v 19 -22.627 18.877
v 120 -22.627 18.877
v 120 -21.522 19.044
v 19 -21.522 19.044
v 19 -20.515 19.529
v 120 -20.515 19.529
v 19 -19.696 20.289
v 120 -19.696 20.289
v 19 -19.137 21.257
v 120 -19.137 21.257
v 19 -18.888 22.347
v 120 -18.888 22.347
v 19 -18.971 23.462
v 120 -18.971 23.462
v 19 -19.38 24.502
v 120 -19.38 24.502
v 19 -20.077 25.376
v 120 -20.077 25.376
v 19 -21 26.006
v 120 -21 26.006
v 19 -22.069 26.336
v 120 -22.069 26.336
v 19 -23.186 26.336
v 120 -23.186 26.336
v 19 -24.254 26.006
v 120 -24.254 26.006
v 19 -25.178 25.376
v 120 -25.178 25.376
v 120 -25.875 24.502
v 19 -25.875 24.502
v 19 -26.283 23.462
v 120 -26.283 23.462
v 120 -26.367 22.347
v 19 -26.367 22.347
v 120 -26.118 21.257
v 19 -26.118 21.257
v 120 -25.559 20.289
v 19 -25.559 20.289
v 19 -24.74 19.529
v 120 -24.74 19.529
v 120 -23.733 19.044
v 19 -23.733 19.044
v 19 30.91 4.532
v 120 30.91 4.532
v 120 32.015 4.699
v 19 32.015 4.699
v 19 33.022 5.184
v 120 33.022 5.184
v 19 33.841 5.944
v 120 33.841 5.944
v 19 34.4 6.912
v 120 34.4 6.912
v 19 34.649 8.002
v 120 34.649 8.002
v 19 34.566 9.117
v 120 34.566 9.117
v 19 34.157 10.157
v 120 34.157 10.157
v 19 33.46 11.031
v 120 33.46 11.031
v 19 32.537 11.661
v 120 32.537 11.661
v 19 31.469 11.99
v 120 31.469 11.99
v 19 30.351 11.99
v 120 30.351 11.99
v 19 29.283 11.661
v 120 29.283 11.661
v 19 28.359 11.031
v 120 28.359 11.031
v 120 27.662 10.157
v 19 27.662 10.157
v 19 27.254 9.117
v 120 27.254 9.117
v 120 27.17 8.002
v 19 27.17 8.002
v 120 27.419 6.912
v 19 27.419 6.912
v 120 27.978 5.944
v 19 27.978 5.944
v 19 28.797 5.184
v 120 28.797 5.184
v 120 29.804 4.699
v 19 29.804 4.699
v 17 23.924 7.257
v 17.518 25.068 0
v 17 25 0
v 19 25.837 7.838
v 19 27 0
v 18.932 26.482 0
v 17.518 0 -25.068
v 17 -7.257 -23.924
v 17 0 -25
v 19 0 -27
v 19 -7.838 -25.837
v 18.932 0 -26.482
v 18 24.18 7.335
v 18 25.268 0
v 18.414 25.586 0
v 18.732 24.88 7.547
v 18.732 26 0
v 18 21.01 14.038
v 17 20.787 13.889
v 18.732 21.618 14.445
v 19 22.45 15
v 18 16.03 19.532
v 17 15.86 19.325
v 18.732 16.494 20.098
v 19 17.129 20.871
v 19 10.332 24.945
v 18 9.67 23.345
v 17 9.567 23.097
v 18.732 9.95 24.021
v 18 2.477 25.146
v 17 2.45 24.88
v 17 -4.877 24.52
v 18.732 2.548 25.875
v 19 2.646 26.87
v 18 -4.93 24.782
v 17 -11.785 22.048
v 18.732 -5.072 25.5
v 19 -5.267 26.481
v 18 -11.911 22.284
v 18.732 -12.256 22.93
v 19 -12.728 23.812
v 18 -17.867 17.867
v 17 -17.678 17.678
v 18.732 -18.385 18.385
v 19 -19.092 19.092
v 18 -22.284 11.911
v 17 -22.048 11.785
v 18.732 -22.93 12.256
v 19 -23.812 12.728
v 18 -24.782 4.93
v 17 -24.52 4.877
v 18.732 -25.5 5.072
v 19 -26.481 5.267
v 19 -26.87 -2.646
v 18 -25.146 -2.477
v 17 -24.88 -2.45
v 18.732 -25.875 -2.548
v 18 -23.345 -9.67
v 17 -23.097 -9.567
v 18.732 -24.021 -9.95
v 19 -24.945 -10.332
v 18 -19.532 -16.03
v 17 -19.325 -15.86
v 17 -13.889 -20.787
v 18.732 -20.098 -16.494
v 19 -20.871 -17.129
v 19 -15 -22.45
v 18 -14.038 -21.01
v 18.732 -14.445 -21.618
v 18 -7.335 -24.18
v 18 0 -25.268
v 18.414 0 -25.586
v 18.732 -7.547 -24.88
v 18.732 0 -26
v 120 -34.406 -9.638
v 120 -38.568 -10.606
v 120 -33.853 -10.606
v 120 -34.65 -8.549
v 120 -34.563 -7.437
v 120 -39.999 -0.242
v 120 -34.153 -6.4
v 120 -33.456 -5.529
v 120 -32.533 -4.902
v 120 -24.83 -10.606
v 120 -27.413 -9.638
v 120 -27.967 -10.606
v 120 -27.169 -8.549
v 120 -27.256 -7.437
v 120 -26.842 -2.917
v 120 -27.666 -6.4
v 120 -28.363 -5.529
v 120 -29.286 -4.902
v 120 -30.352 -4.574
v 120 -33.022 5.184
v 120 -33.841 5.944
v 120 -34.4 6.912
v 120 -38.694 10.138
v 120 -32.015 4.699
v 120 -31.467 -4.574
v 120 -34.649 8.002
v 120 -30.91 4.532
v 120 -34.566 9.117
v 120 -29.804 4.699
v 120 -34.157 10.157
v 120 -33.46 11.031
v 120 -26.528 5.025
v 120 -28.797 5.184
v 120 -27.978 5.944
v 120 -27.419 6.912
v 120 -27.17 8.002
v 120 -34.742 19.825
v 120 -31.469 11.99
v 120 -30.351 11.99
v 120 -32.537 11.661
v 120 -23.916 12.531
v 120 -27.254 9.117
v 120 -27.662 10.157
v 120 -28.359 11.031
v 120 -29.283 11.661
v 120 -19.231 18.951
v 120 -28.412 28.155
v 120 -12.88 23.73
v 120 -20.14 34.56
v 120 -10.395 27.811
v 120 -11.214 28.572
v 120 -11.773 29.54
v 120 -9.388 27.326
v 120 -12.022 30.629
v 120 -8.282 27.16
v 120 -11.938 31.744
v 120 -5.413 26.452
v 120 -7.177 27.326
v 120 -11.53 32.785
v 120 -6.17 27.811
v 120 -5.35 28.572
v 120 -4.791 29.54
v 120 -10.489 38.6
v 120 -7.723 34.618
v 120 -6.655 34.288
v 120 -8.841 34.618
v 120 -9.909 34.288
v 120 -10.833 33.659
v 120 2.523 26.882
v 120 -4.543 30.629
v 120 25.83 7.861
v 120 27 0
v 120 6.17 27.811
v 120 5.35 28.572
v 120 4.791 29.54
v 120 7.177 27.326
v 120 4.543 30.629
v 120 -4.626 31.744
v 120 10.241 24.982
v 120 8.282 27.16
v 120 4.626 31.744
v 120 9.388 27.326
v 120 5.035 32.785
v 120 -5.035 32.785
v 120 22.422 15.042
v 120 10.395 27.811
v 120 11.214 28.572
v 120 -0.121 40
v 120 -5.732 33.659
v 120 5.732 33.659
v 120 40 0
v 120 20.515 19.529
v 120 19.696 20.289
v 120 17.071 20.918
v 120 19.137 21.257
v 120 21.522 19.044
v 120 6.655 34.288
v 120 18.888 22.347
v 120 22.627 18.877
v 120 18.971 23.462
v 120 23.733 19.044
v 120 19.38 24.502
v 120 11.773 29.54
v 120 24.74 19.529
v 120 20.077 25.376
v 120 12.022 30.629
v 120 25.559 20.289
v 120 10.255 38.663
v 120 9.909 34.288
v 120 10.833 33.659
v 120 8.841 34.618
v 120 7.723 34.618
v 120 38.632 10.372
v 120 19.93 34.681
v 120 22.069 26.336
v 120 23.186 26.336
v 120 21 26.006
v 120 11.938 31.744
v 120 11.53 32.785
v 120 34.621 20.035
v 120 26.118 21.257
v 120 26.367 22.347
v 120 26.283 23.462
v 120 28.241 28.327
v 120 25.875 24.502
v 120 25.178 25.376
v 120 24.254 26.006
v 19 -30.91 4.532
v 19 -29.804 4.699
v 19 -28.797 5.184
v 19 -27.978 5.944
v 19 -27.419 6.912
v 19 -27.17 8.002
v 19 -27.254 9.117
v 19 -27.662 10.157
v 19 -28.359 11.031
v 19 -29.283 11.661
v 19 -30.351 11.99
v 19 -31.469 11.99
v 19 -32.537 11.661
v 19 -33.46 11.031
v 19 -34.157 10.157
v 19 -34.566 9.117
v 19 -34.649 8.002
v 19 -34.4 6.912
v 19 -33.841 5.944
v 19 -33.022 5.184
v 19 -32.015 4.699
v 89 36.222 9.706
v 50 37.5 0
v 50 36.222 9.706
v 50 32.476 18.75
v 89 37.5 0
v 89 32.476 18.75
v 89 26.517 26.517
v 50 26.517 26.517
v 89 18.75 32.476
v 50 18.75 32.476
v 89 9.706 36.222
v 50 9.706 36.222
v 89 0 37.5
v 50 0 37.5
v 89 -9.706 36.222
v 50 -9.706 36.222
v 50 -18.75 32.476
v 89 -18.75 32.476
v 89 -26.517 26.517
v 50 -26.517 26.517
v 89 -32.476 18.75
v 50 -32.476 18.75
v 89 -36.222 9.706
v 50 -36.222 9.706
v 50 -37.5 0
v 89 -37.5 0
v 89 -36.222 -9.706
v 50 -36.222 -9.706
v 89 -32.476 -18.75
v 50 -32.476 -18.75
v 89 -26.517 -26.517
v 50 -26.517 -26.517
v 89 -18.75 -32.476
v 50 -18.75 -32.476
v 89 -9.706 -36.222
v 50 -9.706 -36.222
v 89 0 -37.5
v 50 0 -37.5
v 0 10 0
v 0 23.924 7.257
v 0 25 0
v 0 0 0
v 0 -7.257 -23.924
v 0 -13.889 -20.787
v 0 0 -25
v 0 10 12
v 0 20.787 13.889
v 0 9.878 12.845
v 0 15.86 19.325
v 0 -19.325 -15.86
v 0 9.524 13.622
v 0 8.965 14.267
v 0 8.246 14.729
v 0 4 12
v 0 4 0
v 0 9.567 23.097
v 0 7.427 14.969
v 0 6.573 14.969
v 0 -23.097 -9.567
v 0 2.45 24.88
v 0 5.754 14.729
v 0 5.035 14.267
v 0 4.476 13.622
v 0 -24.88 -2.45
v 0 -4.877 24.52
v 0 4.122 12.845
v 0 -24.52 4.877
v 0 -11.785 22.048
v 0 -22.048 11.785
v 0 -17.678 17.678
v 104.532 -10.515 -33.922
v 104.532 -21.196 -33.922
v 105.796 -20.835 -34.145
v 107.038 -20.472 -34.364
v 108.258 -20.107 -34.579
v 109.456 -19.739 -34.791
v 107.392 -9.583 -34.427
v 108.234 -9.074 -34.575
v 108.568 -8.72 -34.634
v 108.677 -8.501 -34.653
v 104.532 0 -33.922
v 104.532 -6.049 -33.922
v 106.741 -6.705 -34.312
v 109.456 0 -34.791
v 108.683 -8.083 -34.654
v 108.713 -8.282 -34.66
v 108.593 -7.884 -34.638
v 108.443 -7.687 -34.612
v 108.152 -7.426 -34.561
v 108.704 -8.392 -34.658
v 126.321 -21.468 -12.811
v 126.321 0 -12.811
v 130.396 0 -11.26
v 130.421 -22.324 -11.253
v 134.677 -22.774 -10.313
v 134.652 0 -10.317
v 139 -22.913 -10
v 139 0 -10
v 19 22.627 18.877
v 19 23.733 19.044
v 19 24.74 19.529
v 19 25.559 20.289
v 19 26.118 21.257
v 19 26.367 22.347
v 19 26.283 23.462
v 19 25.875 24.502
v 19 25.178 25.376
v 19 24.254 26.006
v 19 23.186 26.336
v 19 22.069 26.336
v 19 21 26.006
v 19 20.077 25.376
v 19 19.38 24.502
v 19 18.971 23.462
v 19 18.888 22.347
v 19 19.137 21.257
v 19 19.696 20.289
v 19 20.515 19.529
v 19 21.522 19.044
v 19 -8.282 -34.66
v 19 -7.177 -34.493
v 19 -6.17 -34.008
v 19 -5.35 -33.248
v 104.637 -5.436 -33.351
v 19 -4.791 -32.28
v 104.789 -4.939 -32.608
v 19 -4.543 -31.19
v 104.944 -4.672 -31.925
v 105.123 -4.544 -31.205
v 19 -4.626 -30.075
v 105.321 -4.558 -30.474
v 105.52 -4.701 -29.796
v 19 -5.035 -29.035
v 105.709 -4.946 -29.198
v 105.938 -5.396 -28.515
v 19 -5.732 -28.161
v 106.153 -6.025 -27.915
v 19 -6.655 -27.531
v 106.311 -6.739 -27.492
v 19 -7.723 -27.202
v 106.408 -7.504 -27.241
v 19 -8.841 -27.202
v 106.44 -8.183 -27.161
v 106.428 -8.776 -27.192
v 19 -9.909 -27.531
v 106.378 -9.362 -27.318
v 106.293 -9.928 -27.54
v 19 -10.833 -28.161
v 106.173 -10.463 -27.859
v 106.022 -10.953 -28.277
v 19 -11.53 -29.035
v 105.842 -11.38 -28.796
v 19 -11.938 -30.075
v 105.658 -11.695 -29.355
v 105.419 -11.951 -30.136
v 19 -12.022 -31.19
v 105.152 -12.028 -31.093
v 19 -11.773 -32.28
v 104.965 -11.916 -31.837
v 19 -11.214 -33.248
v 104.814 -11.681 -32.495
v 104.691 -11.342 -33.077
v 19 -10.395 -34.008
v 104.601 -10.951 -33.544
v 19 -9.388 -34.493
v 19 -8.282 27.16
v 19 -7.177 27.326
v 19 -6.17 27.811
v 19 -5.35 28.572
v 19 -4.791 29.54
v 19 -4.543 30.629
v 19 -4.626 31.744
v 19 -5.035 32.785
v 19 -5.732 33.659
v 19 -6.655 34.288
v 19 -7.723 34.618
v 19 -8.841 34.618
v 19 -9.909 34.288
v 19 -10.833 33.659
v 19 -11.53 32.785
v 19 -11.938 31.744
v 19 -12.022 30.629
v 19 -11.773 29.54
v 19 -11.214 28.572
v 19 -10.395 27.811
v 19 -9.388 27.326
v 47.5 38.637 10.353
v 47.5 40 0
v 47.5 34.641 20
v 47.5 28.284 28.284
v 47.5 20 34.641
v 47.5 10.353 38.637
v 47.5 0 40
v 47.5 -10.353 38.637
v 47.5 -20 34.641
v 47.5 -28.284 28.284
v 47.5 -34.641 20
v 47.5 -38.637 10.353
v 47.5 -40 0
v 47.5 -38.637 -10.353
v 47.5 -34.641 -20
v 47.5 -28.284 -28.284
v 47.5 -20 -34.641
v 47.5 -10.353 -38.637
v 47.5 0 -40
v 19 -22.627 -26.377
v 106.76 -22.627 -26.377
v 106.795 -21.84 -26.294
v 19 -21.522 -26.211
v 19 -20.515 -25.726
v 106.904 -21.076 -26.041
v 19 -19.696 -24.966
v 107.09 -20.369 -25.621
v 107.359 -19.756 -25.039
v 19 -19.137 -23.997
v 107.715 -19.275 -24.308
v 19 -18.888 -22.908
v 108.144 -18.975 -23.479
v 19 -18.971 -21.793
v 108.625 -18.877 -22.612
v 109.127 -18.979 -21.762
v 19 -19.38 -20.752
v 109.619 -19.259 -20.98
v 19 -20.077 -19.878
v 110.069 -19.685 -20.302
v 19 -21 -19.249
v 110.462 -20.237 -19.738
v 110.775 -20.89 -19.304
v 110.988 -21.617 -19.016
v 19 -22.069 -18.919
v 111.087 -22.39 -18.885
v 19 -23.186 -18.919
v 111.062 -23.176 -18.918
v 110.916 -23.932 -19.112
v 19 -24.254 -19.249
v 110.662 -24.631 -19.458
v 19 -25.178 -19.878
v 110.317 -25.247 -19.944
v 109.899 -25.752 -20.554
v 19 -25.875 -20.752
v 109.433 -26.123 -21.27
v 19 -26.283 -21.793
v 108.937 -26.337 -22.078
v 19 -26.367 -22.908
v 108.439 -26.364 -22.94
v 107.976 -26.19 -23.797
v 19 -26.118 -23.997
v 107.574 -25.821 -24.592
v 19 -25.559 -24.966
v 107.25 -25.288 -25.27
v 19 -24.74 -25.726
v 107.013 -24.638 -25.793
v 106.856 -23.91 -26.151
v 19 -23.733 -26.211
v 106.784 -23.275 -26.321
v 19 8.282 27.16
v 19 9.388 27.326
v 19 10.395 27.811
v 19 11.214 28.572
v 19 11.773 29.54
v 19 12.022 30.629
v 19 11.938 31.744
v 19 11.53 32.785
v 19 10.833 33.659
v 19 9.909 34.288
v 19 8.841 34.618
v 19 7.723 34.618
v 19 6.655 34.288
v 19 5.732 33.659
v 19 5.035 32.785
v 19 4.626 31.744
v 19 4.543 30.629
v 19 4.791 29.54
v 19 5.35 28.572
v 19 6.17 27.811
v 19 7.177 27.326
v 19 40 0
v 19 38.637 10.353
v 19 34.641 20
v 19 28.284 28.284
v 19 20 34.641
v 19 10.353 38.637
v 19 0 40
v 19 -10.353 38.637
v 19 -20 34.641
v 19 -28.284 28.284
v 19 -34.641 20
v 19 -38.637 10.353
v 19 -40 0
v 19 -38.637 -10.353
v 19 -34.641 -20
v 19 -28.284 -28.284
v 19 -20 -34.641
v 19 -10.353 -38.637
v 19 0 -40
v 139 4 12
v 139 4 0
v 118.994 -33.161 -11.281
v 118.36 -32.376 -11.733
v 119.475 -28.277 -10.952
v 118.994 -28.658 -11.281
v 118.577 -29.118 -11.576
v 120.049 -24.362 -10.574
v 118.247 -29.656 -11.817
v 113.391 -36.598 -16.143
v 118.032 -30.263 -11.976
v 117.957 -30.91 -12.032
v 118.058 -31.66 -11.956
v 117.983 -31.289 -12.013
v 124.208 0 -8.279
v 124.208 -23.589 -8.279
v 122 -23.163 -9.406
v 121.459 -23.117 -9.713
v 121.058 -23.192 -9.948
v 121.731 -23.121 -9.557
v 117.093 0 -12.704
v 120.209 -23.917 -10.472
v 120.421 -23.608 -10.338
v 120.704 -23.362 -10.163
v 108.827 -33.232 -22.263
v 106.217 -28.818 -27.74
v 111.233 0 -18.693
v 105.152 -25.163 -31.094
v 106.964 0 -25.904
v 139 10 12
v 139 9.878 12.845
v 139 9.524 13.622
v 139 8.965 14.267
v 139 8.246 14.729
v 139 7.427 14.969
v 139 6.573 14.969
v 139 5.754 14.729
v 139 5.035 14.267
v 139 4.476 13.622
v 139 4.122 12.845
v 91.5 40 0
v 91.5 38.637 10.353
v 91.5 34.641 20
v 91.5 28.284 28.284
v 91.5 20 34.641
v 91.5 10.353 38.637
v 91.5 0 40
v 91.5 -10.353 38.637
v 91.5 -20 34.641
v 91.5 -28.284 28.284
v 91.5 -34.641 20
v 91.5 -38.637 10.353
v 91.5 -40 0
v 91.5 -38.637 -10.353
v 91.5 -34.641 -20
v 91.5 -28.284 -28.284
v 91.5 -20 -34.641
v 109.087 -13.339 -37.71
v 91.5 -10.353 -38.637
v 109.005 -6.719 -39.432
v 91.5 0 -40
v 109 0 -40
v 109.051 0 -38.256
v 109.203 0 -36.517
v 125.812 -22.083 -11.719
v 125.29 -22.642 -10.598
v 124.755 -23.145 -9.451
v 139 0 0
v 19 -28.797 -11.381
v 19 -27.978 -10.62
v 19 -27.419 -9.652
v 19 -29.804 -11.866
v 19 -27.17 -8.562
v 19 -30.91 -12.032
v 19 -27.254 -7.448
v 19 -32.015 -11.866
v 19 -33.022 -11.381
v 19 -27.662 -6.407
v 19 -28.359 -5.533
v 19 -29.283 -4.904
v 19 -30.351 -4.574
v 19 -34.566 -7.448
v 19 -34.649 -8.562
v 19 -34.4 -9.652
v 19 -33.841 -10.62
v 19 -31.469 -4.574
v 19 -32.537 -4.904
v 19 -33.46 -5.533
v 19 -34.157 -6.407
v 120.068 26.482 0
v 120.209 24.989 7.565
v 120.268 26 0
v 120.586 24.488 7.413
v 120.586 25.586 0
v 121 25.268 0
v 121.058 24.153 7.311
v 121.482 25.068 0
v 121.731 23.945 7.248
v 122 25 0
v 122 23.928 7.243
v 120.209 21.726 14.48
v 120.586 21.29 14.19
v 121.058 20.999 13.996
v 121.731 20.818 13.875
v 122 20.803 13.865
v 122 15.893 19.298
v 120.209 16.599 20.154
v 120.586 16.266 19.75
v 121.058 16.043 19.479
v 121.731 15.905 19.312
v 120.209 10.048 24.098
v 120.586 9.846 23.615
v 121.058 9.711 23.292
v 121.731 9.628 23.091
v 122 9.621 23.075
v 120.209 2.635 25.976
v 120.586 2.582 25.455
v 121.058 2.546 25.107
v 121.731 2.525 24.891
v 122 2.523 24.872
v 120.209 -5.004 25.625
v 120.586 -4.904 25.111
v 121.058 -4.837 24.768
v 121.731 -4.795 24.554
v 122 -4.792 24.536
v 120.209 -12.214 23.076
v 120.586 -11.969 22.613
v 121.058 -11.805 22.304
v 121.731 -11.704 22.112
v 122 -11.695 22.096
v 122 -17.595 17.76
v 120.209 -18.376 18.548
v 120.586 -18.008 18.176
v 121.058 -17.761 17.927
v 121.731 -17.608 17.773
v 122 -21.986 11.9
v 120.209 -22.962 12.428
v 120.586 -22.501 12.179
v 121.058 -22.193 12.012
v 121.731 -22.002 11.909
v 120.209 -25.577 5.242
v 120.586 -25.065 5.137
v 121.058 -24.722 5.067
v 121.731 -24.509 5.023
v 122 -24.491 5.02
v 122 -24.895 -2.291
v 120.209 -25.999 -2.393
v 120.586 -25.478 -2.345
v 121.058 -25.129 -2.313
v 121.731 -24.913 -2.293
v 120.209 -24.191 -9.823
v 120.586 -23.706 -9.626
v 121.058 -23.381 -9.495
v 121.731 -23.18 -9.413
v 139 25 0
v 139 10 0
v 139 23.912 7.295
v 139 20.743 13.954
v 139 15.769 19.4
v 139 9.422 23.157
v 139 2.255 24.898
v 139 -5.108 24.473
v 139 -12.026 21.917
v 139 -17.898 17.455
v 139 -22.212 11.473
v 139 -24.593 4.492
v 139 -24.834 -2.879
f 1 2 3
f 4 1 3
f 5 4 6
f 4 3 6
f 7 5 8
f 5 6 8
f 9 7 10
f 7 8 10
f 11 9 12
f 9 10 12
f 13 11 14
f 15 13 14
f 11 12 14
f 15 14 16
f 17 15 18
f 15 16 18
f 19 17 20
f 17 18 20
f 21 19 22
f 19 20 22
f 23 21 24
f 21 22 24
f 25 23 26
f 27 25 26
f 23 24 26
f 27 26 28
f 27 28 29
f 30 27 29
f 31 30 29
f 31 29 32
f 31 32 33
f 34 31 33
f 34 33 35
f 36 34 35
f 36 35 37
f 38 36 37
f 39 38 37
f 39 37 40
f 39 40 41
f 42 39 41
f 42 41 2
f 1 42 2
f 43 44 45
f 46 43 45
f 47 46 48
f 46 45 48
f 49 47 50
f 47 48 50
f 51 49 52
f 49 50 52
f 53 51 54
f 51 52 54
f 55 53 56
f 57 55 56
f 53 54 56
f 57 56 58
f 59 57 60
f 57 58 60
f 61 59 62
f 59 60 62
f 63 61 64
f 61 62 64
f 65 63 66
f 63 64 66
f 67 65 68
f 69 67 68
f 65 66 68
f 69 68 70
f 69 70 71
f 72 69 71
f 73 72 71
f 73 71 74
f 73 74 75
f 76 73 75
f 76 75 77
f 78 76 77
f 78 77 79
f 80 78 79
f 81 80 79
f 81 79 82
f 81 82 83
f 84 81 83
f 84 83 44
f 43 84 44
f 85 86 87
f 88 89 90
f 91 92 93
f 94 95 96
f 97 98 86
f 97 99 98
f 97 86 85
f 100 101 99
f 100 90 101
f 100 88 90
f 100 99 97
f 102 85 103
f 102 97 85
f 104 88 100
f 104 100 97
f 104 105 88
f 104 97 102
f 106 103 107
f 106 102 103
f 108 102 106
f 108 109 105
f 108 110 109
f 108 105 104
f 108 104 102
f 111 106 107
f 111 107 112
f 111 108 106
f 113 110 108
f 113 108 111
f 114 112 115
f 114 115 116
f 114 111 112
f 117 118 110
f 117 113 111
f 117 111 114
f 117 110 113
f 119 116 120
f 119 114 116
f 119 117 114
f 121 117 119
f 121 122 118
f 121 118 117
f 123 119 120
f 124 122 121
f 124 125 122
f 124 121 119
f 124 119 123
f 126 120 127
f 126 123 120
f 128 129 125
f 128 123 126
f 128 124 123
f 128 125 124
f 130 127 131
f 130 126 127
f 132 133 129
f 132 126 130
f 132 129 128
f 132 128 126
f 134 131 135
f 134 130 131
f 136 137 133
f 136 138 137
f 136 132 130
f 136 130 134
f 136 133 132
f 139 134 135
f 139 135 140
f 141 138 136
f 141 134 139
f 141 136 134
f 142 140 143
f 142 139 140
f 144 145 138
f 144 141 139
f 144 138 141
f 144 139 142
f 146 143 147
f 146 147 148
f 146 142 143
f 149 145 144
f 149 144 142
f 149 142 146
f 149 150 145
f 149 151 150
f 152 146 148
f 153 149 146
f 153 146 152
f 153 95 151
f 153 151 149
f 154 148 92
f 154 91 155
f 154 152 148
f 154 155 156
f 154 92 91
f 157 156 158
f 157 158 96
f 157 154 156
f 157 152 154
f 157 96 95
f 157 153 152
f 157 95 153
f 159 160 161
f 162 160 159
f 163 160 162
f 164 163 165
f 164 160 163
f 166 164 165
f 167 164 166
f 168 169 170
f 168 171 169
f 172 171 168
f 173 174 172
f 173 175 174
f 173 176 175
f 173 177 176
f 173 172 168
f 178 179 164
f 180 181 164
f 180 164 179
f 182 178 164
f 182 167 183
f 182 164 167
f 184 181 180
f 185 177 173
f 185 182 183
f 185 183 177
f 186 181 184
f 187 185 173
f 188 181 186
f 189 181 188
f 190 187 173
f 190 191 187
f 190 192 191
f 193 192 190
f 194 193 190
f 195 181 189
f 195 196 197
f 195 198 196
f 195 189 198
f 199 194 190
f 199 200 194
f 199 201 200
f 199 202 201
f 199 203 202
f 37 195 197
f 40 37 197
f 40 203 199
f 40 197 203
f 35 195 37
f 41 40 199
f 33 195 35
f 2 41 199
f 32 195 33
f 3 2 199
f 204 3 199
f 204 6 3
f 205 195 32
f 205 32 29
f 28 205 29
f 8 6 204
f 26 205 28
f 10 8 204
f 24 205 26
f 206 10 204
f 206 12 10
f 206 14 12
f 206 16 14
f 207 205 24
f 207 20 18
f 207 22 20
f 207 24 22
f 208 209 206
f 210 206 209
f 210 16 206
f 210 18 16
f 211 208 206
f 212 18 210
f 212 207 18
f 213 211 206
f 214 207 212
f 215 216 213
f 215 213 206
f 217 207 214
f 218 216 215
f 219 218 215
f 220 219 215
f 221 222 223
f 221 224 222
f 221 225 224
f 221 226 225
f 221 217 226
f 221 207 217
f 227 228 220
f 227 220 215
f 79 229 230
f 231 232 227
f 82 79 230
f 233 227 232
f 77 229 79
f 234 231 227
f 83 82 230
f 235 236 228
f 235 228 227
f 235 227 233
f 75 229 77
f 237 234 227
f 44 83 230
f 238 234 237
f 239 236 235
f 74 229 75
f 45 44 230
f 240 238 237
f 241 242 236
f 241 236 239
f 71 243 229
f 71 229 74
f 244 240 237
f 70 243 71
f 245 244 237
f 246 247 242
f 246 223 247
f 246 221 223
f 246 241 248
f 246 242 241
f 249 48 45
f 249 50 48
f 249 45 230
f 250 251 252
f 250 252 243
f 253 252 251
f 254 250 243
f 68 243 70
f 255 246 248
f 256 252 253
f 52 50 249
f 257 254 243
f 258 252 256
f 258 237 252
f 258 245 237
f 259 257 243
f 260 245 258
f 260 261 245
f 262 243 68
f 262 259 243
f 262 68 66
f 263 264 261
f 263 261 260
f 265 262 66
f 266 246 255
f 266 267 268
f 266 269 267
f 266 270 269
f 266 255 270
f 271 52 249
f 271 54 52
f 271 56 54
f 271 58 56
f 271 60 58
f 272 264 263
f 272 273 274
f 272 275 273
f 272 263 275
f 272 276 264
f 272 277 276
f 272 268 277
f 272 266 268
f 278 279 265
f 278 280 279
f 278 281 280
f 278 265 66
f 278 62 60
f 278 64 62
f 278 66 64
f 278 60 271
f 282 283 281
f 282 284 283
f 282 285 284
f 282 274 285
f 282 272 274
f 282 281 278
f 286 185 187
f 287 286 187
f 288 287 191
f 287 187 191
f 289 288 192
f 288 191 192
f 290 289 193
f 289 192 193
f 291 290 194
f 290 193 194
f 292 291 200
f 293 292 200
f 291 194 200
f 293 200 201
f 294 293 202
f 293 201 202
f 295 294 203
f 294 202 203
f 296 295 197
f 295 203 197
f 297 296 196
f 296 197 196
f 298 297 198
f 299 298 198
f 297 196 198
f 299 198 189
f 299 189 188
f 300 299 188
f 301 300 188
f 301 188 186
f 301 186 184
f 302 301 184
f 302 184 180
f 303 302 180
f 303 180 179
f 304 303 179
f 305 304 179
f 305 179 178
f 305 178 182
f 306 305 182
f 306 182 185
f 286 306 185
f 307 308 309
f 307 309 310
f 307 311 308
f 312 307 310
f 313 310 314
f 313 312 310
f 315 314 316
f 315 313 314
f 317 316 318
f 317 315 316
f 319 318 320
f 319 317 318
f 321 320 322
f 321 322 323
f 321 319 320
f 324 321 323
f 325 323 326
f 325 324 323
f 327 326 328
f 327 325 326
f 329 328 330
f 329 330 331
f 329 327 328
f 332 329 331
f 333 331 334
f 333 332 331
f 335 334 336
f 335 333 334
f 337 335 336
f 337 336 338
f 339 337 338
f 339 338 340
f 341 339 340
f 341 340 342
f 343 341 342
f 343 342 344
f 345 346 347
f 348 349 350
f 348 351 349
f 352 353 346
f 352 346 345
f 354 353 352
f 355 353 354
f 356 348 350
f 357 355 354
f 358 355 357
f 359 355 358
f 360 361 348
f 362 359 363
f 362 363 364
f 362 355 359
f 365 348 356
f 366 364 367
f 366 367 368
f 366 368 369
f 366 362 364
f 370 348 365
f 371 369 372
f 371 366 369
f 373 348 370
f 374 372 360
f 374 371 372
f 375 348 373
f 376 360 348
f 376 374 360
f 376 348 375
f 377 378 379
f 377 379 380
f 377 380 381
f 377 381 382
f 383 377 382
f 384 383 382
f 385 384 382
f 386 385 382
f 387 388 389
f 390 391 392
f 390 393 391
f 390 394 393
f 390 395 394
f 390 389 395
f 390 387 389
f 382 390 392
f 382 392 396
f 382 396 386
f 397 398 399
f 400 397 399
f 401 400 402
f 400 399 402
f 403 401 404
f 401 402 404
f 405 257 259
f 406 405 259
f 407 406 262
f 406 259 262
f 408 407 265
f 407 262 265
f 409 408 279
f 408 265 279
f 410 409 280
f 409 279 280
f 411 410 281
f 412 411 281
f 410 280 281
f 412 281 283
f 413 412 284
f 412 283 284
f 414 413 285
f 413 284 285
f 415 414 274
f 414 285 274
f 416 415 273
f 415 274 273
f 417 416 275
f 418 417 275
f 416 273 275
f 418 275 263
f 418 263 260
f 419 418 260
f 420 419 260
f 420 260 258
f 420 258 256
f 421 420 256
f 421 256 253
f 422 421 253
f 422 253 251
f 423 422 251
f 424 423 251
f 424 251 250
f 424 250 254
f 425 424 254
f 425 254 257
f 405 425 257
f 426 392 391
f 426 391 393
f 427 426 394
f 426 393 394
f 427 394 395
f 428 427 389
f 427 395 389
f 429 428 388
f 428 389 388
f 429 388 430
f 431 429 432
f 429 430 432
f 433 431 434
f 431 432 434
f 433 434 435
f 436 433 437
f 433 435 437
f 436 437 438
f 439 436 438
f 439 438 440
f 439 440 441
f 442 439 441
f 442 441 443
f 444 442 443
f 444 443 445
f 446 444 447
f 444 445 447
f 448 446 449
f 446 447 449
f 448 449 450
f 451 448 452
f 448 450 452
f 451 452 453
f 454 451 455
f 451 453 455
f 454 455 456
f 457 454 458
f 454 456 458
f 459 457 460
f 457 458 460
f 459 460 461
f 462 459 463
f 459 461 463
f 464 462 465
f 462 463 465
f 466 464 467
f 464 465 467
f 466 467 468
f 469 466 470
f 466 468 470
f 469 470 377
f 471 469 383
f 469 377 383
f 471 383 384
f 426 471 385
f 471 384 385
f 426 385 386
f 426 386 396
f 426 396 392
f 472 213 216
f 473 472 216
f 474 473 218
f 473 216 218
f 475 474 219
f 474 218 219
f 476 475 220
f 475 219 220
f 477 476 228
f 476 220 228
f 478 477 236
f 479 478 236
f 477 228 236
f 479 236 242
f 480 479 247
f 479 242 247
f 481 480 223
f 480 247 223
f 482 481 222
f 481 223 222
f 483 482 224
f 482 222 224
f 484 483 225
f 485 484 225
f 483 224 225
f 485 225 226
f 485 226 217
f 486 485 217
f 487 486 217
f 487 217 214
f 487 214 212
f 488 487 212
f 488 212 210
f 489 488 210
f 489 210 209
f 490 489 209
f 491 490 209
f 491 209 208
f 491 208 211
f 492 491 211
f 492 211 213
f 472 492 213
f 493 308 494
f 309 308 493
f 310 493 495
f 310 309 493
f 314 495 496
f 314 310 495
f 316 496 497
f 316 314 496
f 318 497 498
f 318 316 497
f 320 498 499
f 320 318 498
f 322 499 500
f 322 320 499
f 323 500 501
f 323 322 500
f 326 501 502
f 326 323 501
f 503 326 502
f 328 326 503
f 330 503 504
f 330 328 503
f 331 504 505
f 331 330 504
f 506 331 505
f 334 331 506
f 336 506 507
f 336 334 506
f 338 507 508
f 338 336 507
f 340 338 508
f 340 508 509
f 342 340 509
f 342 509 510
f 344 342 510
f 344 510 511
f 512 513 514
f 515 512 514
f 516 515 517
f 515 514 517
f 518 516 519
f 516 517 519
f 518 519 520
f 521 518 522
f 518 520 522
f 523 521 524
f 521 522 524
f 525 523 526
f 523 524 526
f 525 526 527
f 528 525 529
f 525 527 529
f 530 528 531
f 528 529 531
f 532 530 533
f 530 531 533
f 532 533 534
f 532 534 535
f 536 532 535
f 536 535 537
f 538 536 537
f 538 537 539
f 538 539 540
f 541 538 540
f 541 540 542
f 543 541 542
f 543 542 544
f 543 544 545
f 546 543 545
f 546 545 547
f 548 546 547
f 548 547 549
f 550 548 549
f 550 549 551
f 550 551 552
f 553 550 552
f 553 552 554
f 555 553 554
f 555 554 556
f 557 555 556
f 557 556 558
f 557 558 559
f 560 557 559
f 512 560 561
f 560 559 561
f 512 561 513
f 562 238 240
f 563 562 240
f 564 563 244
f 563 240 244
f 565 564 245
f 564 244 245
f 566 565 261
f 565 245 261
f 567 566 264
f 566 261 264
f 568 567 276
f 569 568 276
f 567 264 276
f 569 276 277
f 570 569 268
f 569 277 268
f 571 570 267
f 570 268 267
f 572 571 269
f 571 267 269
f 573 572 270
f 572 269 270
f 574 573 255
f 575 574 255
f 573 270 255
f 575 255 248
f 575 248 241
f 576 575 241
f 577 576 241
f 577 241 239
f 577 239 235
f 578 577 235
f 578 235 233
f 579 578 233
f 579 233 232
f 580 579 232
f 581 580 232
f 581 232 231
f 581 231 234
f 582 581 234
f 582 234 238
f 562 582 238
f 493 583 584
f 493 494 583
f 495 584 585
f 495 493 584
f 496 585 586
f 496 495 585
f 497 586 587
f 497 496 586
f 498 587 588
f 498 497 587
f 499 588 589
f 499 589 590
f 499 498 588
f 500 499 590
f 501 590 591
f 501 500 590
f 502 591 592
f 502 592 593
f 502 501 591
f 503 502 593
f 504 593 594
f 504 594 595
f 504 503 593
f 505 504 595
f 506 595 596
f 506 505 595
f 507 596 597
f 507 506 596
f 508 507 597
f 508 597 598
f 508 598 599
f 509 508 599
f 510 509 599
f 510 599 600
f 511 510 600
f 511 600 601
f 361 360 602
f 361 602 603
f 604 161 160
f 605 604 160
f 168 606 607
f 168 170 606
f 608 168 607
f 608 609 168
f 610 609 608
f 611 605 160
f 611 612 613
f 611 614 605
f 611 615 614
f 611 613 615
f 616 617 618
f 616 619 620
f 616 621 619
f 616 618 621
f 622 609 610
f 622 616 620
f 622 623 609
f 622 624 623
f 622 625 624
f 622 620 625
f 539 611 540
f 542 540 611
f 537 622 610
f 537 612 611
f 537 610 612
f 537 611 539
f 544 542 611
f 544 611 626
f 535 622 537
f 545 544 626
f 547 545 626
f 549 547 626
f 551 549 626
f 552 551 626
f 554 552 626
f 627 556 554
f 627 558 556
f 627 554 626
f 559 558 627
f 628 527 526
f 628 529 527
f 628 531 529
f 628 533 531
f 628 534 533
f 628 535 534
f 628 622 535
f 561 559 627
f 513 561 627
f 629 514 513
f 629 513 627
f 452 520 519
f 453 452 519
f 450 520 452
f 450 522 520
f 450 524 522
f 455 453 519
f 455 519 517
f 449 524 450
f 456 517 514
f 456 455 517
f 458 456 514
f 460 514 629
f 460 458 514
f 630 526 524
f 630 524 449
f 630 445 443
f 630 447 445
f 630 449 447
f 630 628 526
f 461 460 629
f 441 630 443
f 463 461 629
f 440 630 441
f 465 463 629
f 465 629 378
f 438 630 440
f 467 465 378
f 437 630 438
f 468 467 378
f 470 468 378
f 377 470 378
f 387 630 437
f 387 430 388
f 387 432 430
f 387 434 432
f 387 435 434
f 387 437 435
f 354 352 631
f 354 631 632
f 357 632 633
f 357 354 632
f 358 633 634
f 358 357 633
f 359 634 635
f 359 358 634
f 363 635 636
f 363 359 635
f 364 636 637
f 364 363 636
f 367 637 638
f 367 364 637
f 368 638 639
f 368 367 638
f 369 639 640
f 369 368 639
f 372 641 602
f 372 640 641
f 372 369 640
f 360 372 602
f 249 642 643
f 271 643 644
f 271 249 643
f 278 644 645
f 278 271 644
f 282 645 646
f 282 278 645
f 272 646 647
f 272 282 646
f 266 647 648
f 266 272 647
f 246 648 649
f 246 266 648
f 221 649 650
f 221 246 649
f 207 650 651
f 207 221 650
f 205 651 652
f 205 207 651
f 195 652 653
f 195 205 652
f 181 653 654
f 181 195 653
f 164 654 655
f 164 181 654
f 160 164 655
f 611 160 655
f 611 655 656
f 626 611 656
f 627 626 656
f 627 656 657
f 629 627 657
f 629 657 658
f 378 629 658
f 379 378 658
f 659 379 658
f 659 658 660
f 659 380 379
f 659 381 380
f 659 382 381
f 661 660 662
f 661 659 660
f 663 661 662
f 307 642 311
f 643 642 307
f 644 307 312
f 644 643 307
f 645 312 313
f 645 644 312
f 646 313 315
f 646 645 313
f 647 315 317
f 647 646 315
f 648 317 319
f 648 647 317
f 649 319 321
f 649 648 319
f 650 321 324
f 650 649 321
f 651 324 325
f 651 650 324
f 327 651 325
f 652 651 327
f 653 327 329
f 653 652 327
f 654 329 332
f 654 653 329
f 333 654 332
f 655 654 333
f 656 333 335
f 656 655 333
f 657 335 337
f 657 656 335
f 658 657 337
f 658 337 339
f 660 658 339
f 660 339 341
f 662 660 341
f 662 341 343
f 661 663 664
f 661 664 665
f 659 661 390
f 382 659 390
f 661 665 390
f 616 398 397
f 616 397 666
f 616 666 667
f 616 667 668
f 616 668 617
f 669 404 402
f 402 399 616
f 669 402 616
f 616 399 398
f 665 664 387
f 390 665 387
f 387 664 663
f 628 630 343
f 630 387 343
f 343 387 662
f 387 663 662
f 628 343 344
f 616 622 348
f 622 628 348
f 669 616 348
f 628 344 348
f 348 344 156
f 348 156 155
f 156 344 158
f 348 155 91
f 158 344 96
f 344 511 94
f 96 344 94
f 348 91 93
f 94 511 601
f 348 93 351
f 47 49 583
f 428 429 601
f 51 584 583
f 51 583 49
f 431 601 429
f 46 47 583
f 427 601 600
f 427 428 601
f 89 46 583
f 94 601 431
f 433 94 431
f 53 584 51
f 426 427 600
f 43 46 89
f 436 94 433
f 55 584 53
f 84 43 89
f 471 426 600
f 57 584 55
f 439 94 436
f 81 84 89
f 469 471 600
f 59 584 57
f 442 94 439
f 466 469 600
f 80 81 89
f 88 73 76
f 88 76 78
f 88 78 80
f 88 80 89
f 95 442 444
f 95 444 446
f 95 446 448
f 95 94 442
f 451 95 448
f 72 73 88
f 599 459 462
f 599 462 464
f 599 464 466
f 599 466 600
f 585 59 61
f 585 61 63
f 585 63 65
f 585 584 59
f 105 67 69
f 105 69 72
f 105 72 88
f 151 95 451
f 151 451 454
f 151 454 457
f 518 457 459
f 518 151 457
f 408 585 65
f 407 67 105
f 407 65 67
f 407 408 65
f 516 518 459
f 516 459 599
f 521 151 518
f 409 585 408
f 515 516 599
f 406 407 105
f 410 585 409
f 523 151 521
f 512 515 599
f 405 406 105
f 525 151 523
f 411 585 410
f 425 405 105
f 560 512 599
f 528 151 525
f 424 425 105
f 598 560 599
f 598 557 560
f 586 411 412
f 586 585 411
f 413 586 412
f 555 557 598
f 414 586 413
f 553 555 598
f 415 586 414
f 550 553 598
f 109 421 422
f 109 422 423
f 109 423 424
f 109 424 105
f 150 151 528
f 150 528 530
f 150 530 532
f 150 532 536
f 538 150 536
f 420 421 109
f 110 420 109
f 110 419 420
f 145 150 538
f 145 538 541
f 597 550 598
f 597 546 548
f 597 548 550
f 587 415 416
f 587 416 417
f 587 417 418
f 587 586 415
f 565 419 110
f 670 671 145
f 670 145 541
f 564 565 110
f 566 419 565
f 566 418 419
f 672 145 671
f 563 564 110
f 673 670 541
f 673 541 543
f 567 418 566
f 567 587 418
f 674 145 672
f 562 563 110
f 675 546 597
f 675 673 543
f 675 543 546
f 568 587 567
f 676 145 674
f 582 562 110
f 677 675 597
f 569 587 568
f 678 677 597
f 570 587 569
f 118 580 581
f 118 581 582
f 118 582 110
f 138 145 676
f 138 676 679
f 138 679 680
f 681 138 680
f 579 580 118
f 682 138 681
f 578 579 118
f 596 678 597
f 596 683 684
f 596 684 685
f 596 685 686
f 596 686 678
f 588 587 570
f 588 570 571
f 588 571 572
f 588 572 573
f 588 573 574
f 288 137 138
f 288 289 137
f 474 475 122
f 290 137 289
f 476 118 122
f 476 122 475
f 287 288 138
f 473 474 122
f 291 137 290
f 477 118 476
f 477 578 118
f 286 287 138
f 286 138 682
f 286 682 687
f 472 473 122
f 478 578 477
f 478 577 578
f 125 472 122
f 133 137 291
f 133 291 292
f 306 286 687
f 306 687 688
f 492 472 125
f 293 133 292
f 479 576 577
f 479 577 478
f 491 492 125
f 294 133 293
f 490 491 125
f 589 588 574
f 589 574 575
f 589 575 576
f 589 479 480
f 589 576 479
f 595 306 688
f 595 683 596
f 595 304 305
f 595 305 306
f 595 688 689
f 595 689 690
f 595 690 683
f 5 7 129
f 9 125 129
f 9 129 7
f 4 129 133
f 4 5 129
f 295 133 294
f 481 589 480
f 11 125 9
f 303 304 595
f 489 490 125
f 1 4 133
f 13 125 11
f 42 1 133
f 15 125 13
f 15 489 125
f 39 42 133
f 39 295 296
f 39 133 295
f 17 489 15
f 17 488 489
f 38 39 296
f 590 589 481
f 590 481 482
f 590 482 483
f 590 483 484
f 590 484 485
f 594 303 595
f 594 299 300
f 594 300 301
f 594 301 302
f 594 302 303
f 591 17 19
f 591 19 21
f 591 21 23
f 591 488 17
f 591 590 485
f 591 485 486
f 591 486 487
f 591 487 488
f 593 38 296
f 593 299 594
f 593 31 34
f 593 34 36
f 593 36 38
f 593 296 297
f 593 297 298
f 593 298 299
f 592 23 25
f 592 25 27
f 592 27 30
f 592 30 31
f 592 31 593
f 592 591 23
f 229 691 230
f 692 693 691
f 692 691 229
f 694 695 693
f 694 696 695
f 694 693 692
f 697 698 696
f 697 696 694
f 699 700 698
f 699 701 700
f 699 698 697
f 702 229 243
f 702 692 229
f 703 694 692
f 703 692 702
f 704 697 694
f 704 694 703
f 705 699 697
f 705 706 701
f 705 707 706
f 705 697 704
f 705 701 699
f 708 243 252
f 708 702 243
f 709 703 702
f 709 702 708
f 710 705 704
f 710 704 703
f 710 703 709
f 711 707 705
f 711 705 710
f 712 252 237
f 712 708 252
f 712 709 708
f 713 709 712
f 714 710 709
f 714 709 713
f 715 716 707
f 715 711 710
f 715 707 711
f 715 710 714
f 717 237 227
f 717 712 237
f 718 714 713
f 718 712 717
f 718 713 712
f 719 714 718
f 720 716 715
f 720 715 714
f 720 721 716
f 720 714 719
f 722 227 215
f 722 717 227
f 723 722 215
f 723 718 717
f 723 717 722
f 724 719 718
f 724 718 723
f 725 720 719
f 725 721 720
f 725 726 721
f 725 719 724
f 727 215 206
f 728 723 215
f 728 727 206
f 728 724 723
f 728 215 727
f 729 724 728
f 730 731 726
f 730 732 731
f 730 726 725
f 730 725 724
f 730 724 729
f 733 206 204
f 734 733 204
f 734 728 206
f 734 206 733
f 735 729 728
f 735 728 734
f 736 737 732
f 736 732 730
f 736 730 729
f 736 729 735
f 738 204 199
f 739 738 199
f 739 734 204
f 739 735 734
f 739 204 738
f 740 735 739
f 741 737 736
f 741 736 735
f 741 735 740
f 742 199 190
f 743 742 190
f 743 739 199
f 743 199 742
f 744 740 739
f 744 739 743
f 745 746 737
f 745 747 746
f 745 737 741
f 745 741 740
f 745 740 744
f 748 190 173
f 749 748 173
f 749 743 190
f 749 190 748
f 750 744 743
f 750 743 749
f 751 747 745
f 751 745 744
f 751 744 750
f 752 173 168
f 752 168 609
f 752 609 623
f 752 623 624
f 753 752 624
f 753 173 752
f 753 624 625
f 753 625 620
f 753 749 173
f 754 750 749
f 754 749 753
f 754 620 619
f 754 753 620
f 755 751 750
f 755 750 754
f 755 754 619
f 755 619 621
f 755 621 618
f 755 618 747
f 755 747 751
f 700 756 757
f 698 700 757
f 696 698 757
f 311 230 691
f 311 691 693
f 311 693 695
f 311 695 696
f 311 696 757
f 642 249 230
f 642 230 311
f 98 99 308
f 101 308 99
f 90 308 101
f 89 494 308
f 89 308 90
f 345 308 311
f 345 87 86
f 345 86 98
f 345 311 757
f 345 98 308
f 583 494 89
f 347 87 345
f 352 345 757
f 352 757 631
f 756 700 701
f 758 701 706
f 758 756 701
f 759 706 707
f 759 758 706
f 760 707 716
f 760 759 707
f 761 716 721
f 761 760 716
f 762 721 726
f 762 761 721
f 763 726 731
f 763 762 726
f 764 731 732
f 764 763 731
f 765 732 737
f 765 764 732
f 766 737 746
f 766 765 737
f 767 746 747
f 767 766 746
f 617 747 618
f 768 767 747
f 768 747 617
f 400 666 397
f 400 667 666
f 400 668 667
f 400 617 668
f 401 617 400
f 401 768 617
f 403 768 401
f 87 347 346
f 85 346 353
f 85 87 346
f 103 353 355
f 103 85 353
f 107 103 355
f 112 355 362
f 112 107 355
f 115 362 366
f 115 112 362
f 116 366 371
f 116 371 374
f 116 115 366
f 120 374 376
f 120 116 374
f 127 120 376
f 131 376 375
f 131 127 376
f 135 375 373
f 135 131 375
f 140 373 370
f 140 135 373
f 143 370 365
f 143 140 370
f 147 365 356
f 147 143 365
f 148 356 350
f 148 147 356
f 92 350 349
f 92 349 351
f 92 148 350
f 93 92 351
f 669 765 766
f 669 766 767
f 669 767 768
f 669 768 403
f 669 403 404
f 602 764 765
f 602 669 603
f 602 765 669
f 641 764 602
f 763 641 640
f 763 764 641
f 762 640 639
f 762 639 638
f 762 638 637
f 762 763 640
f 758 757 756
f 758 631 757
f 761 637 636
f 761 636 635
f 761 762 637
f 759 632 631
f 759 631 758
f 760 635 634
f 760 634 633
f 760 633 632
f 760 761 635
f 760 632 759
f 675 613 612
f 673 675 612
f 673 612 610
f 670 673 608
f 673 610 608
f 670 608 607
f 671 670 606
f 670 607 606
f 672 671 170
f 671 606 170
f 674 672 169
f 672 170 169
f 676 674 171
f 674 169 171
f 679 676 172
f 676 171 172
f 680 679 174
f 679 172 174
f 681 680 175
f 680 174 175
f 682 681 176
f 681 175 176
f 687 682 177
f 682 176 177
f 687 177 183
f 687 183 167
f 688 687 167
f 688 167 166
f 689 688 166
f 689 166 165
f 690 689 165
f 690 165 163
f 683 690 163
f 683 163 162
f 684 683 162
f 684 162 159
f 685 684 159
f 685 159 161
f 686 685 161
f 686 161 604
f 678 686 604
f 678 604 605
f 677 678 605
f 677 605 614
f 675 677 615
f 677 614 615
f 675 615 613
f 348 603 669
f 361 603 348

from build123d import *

# Parameters (mm, degrees)
REVOLVE1_ANGLE     = 270
CUT_EXTRUDE1_DEPTH = 151.069983674
SKETCH3_R          = 3.75
CUT_EXTRUDE2_DEPTH = 133.664991614
SKETCH5_R          = 30
CUT_EXTRUDE3_DEPTH = 151.069983674
CUT_EXTRUDE4_DEPTH = 151.06998382


with BuildPart() as part:
    # Sketch1 → Revolve1 (revolve)
    with BuildSketch(Plane.XY):
        with BuildLine():
            Line((47.5, 40), (50, 37.5))
            Line((50, 37.5), (89, 37.5))
            Line((89, 37.5), (91.5, 40))
            Line((91.5, 40), (120, 40))
            Line((120, 40), (120, 27))
            ThreePointArc((120, 27), (120.585786438, 25.585786438), (122, 25))
            Line((122, 25), (139, 25))
            Line((139, 25), (139, 0))
            Line((139, 0), (0, 0))
            Line((0, 0), (0, 25))
            Line((0, 25), (17, 25))
            ThreePointArc((17, 25), (18.414213562, 25.585786438), (19, 27))
            Line((19, 27), (19, 40))
            Line((19, 40), (47.5, 40))
        make_face()
    revolve(axis=Axis((0, 0, 0), (1, 0, 0)), revolution_arc=REVOLVE1_ANGLE)

    # Sketch2 → Cut-Extrude1 (cut, through all)
    with BuildSketch(Plane.ZY):
        with BuildLine():
            Line((0, 10), (12, 10))
            ThreePointArc((12, 10), (15, 7), (12, 4))
            Line((12, 4), (0, 4))
            ThreePointArc((0, 4), (-3, 7), (0, 10))
        make_face()
    extrude(amount=-CUT_EXTRUDE1_DEPTH, mode=Mode.SUBTRACT)

    # Sketch3 → Cut-Extrude2 (cut, through all)
    with BuildSketch(Plane(origin=(120, 0, 0), x_dir=(0, 0, -1), z_dir=(1, 0, 0))):
        with Locations((-8.282209443, 30.909626441)):
            Circle(SKETCH3_R)
        with Locations((30.909626441, -8.282209443)):
            Circle(SKETCH3_R)
        with Locations((22.627416998, -22.627416998)):
            Circle(SKETCH3_R)
        with Locations((8.282209443, -30.909626441)):
            Circle(SKETCH3_R)
        with Locations((-8.282209443, -30.909626441)):
            Circle(SKETCH3_R)
        with Locations((-22.627416998, -22.627416998)):
            Circle(SKETCH3_R)
        with Locations((-30.909626441, -8.282209443)):
            Circle(SKETCH3_R)
        with Locations((-30.909626441, 8.282209443)):
            Circle(SKETCH3_R)
        with Locations((-22.627416998, 22.627416998)):
            Circle(SKETCH3_R)
    extrude(amount=-CUT_EXTRUDE2_DEPTH, mode=Mode.SUBTRACT)

    # Sketch5 → Cut-Extrude3 (cut, through all)
    with BuildSketch(Plane(origin=(0, 0, 0), x_dir=(1, 0, 0), z_dir=(0, 1, 0))):
        with Locations((139, 40)):
            Circle(SKETCH5_R)
    extrude(amount=-CUT_EXTRUDE3_DEPTH, mode=Mode.SUBTRACT)

    # Sketch6 → Cut-Extrude4 (cut, through all)
    with BuildSketch(Plane(origin=(0, 0, 0), x_dir=(1, 0, 0), z_dir=(0, 1, 0))):
        with BuildLine():
            Line((104.531728645, 33.922313782), (109.45576741, 34.79055467))
            ThreePointArc((109.45576741, 34.79055467), (115.199399791, 21.73715713), (126.321452148, 12.810766389))
            Line((126.321452148, 12.810766389), (124.208360839, 8.279227454))
            ThreePointArc((124.208360839, 8.279227454), (111.23263309, 18.693349985), (104.531728645, 33.922313782))
        make_face()
    extrude(amount=-CUT_EXTRUDE4_DEPTH, mode=Mode.SUBTRACT)


solid = part.part
